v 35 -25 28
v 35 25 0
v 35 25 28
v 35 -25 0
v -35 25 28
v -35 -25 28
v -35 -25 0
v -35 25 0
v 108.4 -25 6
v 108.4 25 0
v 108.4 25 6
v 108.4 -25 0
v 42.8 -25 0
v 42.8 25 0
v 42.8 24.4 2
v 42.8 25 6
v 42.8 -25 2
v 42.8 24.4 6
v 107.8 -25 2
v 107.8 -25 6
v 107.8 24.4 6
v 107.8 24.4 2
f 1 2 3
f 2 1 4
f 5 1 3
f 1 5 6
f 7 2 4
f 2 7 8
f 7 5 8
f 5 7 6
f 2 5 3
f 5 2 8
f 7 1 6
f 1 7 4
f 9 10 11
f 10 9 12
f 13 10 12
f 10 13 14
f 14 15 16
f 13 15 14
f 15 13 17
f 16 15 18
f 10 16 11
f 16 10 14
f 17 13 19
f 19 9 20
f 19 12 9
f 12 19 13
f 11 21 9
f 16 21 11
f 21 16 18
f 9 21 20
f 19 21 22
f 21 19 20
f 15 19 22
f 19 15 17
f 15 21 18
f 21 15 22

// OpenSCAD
// Two-part enclosure for a small electronics board (e.g. Arduino-based temperature logger)
// Print orientation: box stands on its floor, lid is printed upside down on the +X side.

$fn = 64;

// ---- Box ----
box_x      = 70;    // outer length (X)
box_y      = 50;    // outer width (Y)
box_z      = 30;    // outer height (Z)
wall       = 2;     // wall thickness
floor      = 2;     // floor thickness (included in wall)

// ---- Lid ----
lip_outer_x = 65.6; // outer size of lip in X
lip_outer_y = 45.6; // outer size of lip in Y
lip_h       = 4;    // lip height above plate
plate_t     = 2;    // plate thickness
eps         = 0.2;  // clearance between lip inner size and box opening

// ---- Layout ----
gap        = 10;    // gap between parts on the bed
lip_overhang = box_x - lip_outer_x; // how far the lip extends past the plate (2.4 mm each side)

difference() {
    union() {
        // Box
        translate([-box_x/2, -box_y/2, 0])
            cube([box_x, box_y, box_z - floor]);

        // Lid: plate + lip
        translate([box_x/2 + gap - lip_overhang/2, -box_y/2, 0])
            cube([lip_outer_x, box_y, plate_t]);
        translate([box_x/2 + gap - lip_overhang/2, -box_y/2, plate_t])
            cube([lip_outer_x, box_y, lip_h]);
    }

    // Lip pocket cut into the top of the plate (through the full lip height)
    translate([box_x/2 + gap - lip_overhang/2 - eps, -box_y/2 - eps, plate_t])
        cube([lip_outer_x - 2*eps, box_y - 2*eps, lip_h + 0.01]);
}
